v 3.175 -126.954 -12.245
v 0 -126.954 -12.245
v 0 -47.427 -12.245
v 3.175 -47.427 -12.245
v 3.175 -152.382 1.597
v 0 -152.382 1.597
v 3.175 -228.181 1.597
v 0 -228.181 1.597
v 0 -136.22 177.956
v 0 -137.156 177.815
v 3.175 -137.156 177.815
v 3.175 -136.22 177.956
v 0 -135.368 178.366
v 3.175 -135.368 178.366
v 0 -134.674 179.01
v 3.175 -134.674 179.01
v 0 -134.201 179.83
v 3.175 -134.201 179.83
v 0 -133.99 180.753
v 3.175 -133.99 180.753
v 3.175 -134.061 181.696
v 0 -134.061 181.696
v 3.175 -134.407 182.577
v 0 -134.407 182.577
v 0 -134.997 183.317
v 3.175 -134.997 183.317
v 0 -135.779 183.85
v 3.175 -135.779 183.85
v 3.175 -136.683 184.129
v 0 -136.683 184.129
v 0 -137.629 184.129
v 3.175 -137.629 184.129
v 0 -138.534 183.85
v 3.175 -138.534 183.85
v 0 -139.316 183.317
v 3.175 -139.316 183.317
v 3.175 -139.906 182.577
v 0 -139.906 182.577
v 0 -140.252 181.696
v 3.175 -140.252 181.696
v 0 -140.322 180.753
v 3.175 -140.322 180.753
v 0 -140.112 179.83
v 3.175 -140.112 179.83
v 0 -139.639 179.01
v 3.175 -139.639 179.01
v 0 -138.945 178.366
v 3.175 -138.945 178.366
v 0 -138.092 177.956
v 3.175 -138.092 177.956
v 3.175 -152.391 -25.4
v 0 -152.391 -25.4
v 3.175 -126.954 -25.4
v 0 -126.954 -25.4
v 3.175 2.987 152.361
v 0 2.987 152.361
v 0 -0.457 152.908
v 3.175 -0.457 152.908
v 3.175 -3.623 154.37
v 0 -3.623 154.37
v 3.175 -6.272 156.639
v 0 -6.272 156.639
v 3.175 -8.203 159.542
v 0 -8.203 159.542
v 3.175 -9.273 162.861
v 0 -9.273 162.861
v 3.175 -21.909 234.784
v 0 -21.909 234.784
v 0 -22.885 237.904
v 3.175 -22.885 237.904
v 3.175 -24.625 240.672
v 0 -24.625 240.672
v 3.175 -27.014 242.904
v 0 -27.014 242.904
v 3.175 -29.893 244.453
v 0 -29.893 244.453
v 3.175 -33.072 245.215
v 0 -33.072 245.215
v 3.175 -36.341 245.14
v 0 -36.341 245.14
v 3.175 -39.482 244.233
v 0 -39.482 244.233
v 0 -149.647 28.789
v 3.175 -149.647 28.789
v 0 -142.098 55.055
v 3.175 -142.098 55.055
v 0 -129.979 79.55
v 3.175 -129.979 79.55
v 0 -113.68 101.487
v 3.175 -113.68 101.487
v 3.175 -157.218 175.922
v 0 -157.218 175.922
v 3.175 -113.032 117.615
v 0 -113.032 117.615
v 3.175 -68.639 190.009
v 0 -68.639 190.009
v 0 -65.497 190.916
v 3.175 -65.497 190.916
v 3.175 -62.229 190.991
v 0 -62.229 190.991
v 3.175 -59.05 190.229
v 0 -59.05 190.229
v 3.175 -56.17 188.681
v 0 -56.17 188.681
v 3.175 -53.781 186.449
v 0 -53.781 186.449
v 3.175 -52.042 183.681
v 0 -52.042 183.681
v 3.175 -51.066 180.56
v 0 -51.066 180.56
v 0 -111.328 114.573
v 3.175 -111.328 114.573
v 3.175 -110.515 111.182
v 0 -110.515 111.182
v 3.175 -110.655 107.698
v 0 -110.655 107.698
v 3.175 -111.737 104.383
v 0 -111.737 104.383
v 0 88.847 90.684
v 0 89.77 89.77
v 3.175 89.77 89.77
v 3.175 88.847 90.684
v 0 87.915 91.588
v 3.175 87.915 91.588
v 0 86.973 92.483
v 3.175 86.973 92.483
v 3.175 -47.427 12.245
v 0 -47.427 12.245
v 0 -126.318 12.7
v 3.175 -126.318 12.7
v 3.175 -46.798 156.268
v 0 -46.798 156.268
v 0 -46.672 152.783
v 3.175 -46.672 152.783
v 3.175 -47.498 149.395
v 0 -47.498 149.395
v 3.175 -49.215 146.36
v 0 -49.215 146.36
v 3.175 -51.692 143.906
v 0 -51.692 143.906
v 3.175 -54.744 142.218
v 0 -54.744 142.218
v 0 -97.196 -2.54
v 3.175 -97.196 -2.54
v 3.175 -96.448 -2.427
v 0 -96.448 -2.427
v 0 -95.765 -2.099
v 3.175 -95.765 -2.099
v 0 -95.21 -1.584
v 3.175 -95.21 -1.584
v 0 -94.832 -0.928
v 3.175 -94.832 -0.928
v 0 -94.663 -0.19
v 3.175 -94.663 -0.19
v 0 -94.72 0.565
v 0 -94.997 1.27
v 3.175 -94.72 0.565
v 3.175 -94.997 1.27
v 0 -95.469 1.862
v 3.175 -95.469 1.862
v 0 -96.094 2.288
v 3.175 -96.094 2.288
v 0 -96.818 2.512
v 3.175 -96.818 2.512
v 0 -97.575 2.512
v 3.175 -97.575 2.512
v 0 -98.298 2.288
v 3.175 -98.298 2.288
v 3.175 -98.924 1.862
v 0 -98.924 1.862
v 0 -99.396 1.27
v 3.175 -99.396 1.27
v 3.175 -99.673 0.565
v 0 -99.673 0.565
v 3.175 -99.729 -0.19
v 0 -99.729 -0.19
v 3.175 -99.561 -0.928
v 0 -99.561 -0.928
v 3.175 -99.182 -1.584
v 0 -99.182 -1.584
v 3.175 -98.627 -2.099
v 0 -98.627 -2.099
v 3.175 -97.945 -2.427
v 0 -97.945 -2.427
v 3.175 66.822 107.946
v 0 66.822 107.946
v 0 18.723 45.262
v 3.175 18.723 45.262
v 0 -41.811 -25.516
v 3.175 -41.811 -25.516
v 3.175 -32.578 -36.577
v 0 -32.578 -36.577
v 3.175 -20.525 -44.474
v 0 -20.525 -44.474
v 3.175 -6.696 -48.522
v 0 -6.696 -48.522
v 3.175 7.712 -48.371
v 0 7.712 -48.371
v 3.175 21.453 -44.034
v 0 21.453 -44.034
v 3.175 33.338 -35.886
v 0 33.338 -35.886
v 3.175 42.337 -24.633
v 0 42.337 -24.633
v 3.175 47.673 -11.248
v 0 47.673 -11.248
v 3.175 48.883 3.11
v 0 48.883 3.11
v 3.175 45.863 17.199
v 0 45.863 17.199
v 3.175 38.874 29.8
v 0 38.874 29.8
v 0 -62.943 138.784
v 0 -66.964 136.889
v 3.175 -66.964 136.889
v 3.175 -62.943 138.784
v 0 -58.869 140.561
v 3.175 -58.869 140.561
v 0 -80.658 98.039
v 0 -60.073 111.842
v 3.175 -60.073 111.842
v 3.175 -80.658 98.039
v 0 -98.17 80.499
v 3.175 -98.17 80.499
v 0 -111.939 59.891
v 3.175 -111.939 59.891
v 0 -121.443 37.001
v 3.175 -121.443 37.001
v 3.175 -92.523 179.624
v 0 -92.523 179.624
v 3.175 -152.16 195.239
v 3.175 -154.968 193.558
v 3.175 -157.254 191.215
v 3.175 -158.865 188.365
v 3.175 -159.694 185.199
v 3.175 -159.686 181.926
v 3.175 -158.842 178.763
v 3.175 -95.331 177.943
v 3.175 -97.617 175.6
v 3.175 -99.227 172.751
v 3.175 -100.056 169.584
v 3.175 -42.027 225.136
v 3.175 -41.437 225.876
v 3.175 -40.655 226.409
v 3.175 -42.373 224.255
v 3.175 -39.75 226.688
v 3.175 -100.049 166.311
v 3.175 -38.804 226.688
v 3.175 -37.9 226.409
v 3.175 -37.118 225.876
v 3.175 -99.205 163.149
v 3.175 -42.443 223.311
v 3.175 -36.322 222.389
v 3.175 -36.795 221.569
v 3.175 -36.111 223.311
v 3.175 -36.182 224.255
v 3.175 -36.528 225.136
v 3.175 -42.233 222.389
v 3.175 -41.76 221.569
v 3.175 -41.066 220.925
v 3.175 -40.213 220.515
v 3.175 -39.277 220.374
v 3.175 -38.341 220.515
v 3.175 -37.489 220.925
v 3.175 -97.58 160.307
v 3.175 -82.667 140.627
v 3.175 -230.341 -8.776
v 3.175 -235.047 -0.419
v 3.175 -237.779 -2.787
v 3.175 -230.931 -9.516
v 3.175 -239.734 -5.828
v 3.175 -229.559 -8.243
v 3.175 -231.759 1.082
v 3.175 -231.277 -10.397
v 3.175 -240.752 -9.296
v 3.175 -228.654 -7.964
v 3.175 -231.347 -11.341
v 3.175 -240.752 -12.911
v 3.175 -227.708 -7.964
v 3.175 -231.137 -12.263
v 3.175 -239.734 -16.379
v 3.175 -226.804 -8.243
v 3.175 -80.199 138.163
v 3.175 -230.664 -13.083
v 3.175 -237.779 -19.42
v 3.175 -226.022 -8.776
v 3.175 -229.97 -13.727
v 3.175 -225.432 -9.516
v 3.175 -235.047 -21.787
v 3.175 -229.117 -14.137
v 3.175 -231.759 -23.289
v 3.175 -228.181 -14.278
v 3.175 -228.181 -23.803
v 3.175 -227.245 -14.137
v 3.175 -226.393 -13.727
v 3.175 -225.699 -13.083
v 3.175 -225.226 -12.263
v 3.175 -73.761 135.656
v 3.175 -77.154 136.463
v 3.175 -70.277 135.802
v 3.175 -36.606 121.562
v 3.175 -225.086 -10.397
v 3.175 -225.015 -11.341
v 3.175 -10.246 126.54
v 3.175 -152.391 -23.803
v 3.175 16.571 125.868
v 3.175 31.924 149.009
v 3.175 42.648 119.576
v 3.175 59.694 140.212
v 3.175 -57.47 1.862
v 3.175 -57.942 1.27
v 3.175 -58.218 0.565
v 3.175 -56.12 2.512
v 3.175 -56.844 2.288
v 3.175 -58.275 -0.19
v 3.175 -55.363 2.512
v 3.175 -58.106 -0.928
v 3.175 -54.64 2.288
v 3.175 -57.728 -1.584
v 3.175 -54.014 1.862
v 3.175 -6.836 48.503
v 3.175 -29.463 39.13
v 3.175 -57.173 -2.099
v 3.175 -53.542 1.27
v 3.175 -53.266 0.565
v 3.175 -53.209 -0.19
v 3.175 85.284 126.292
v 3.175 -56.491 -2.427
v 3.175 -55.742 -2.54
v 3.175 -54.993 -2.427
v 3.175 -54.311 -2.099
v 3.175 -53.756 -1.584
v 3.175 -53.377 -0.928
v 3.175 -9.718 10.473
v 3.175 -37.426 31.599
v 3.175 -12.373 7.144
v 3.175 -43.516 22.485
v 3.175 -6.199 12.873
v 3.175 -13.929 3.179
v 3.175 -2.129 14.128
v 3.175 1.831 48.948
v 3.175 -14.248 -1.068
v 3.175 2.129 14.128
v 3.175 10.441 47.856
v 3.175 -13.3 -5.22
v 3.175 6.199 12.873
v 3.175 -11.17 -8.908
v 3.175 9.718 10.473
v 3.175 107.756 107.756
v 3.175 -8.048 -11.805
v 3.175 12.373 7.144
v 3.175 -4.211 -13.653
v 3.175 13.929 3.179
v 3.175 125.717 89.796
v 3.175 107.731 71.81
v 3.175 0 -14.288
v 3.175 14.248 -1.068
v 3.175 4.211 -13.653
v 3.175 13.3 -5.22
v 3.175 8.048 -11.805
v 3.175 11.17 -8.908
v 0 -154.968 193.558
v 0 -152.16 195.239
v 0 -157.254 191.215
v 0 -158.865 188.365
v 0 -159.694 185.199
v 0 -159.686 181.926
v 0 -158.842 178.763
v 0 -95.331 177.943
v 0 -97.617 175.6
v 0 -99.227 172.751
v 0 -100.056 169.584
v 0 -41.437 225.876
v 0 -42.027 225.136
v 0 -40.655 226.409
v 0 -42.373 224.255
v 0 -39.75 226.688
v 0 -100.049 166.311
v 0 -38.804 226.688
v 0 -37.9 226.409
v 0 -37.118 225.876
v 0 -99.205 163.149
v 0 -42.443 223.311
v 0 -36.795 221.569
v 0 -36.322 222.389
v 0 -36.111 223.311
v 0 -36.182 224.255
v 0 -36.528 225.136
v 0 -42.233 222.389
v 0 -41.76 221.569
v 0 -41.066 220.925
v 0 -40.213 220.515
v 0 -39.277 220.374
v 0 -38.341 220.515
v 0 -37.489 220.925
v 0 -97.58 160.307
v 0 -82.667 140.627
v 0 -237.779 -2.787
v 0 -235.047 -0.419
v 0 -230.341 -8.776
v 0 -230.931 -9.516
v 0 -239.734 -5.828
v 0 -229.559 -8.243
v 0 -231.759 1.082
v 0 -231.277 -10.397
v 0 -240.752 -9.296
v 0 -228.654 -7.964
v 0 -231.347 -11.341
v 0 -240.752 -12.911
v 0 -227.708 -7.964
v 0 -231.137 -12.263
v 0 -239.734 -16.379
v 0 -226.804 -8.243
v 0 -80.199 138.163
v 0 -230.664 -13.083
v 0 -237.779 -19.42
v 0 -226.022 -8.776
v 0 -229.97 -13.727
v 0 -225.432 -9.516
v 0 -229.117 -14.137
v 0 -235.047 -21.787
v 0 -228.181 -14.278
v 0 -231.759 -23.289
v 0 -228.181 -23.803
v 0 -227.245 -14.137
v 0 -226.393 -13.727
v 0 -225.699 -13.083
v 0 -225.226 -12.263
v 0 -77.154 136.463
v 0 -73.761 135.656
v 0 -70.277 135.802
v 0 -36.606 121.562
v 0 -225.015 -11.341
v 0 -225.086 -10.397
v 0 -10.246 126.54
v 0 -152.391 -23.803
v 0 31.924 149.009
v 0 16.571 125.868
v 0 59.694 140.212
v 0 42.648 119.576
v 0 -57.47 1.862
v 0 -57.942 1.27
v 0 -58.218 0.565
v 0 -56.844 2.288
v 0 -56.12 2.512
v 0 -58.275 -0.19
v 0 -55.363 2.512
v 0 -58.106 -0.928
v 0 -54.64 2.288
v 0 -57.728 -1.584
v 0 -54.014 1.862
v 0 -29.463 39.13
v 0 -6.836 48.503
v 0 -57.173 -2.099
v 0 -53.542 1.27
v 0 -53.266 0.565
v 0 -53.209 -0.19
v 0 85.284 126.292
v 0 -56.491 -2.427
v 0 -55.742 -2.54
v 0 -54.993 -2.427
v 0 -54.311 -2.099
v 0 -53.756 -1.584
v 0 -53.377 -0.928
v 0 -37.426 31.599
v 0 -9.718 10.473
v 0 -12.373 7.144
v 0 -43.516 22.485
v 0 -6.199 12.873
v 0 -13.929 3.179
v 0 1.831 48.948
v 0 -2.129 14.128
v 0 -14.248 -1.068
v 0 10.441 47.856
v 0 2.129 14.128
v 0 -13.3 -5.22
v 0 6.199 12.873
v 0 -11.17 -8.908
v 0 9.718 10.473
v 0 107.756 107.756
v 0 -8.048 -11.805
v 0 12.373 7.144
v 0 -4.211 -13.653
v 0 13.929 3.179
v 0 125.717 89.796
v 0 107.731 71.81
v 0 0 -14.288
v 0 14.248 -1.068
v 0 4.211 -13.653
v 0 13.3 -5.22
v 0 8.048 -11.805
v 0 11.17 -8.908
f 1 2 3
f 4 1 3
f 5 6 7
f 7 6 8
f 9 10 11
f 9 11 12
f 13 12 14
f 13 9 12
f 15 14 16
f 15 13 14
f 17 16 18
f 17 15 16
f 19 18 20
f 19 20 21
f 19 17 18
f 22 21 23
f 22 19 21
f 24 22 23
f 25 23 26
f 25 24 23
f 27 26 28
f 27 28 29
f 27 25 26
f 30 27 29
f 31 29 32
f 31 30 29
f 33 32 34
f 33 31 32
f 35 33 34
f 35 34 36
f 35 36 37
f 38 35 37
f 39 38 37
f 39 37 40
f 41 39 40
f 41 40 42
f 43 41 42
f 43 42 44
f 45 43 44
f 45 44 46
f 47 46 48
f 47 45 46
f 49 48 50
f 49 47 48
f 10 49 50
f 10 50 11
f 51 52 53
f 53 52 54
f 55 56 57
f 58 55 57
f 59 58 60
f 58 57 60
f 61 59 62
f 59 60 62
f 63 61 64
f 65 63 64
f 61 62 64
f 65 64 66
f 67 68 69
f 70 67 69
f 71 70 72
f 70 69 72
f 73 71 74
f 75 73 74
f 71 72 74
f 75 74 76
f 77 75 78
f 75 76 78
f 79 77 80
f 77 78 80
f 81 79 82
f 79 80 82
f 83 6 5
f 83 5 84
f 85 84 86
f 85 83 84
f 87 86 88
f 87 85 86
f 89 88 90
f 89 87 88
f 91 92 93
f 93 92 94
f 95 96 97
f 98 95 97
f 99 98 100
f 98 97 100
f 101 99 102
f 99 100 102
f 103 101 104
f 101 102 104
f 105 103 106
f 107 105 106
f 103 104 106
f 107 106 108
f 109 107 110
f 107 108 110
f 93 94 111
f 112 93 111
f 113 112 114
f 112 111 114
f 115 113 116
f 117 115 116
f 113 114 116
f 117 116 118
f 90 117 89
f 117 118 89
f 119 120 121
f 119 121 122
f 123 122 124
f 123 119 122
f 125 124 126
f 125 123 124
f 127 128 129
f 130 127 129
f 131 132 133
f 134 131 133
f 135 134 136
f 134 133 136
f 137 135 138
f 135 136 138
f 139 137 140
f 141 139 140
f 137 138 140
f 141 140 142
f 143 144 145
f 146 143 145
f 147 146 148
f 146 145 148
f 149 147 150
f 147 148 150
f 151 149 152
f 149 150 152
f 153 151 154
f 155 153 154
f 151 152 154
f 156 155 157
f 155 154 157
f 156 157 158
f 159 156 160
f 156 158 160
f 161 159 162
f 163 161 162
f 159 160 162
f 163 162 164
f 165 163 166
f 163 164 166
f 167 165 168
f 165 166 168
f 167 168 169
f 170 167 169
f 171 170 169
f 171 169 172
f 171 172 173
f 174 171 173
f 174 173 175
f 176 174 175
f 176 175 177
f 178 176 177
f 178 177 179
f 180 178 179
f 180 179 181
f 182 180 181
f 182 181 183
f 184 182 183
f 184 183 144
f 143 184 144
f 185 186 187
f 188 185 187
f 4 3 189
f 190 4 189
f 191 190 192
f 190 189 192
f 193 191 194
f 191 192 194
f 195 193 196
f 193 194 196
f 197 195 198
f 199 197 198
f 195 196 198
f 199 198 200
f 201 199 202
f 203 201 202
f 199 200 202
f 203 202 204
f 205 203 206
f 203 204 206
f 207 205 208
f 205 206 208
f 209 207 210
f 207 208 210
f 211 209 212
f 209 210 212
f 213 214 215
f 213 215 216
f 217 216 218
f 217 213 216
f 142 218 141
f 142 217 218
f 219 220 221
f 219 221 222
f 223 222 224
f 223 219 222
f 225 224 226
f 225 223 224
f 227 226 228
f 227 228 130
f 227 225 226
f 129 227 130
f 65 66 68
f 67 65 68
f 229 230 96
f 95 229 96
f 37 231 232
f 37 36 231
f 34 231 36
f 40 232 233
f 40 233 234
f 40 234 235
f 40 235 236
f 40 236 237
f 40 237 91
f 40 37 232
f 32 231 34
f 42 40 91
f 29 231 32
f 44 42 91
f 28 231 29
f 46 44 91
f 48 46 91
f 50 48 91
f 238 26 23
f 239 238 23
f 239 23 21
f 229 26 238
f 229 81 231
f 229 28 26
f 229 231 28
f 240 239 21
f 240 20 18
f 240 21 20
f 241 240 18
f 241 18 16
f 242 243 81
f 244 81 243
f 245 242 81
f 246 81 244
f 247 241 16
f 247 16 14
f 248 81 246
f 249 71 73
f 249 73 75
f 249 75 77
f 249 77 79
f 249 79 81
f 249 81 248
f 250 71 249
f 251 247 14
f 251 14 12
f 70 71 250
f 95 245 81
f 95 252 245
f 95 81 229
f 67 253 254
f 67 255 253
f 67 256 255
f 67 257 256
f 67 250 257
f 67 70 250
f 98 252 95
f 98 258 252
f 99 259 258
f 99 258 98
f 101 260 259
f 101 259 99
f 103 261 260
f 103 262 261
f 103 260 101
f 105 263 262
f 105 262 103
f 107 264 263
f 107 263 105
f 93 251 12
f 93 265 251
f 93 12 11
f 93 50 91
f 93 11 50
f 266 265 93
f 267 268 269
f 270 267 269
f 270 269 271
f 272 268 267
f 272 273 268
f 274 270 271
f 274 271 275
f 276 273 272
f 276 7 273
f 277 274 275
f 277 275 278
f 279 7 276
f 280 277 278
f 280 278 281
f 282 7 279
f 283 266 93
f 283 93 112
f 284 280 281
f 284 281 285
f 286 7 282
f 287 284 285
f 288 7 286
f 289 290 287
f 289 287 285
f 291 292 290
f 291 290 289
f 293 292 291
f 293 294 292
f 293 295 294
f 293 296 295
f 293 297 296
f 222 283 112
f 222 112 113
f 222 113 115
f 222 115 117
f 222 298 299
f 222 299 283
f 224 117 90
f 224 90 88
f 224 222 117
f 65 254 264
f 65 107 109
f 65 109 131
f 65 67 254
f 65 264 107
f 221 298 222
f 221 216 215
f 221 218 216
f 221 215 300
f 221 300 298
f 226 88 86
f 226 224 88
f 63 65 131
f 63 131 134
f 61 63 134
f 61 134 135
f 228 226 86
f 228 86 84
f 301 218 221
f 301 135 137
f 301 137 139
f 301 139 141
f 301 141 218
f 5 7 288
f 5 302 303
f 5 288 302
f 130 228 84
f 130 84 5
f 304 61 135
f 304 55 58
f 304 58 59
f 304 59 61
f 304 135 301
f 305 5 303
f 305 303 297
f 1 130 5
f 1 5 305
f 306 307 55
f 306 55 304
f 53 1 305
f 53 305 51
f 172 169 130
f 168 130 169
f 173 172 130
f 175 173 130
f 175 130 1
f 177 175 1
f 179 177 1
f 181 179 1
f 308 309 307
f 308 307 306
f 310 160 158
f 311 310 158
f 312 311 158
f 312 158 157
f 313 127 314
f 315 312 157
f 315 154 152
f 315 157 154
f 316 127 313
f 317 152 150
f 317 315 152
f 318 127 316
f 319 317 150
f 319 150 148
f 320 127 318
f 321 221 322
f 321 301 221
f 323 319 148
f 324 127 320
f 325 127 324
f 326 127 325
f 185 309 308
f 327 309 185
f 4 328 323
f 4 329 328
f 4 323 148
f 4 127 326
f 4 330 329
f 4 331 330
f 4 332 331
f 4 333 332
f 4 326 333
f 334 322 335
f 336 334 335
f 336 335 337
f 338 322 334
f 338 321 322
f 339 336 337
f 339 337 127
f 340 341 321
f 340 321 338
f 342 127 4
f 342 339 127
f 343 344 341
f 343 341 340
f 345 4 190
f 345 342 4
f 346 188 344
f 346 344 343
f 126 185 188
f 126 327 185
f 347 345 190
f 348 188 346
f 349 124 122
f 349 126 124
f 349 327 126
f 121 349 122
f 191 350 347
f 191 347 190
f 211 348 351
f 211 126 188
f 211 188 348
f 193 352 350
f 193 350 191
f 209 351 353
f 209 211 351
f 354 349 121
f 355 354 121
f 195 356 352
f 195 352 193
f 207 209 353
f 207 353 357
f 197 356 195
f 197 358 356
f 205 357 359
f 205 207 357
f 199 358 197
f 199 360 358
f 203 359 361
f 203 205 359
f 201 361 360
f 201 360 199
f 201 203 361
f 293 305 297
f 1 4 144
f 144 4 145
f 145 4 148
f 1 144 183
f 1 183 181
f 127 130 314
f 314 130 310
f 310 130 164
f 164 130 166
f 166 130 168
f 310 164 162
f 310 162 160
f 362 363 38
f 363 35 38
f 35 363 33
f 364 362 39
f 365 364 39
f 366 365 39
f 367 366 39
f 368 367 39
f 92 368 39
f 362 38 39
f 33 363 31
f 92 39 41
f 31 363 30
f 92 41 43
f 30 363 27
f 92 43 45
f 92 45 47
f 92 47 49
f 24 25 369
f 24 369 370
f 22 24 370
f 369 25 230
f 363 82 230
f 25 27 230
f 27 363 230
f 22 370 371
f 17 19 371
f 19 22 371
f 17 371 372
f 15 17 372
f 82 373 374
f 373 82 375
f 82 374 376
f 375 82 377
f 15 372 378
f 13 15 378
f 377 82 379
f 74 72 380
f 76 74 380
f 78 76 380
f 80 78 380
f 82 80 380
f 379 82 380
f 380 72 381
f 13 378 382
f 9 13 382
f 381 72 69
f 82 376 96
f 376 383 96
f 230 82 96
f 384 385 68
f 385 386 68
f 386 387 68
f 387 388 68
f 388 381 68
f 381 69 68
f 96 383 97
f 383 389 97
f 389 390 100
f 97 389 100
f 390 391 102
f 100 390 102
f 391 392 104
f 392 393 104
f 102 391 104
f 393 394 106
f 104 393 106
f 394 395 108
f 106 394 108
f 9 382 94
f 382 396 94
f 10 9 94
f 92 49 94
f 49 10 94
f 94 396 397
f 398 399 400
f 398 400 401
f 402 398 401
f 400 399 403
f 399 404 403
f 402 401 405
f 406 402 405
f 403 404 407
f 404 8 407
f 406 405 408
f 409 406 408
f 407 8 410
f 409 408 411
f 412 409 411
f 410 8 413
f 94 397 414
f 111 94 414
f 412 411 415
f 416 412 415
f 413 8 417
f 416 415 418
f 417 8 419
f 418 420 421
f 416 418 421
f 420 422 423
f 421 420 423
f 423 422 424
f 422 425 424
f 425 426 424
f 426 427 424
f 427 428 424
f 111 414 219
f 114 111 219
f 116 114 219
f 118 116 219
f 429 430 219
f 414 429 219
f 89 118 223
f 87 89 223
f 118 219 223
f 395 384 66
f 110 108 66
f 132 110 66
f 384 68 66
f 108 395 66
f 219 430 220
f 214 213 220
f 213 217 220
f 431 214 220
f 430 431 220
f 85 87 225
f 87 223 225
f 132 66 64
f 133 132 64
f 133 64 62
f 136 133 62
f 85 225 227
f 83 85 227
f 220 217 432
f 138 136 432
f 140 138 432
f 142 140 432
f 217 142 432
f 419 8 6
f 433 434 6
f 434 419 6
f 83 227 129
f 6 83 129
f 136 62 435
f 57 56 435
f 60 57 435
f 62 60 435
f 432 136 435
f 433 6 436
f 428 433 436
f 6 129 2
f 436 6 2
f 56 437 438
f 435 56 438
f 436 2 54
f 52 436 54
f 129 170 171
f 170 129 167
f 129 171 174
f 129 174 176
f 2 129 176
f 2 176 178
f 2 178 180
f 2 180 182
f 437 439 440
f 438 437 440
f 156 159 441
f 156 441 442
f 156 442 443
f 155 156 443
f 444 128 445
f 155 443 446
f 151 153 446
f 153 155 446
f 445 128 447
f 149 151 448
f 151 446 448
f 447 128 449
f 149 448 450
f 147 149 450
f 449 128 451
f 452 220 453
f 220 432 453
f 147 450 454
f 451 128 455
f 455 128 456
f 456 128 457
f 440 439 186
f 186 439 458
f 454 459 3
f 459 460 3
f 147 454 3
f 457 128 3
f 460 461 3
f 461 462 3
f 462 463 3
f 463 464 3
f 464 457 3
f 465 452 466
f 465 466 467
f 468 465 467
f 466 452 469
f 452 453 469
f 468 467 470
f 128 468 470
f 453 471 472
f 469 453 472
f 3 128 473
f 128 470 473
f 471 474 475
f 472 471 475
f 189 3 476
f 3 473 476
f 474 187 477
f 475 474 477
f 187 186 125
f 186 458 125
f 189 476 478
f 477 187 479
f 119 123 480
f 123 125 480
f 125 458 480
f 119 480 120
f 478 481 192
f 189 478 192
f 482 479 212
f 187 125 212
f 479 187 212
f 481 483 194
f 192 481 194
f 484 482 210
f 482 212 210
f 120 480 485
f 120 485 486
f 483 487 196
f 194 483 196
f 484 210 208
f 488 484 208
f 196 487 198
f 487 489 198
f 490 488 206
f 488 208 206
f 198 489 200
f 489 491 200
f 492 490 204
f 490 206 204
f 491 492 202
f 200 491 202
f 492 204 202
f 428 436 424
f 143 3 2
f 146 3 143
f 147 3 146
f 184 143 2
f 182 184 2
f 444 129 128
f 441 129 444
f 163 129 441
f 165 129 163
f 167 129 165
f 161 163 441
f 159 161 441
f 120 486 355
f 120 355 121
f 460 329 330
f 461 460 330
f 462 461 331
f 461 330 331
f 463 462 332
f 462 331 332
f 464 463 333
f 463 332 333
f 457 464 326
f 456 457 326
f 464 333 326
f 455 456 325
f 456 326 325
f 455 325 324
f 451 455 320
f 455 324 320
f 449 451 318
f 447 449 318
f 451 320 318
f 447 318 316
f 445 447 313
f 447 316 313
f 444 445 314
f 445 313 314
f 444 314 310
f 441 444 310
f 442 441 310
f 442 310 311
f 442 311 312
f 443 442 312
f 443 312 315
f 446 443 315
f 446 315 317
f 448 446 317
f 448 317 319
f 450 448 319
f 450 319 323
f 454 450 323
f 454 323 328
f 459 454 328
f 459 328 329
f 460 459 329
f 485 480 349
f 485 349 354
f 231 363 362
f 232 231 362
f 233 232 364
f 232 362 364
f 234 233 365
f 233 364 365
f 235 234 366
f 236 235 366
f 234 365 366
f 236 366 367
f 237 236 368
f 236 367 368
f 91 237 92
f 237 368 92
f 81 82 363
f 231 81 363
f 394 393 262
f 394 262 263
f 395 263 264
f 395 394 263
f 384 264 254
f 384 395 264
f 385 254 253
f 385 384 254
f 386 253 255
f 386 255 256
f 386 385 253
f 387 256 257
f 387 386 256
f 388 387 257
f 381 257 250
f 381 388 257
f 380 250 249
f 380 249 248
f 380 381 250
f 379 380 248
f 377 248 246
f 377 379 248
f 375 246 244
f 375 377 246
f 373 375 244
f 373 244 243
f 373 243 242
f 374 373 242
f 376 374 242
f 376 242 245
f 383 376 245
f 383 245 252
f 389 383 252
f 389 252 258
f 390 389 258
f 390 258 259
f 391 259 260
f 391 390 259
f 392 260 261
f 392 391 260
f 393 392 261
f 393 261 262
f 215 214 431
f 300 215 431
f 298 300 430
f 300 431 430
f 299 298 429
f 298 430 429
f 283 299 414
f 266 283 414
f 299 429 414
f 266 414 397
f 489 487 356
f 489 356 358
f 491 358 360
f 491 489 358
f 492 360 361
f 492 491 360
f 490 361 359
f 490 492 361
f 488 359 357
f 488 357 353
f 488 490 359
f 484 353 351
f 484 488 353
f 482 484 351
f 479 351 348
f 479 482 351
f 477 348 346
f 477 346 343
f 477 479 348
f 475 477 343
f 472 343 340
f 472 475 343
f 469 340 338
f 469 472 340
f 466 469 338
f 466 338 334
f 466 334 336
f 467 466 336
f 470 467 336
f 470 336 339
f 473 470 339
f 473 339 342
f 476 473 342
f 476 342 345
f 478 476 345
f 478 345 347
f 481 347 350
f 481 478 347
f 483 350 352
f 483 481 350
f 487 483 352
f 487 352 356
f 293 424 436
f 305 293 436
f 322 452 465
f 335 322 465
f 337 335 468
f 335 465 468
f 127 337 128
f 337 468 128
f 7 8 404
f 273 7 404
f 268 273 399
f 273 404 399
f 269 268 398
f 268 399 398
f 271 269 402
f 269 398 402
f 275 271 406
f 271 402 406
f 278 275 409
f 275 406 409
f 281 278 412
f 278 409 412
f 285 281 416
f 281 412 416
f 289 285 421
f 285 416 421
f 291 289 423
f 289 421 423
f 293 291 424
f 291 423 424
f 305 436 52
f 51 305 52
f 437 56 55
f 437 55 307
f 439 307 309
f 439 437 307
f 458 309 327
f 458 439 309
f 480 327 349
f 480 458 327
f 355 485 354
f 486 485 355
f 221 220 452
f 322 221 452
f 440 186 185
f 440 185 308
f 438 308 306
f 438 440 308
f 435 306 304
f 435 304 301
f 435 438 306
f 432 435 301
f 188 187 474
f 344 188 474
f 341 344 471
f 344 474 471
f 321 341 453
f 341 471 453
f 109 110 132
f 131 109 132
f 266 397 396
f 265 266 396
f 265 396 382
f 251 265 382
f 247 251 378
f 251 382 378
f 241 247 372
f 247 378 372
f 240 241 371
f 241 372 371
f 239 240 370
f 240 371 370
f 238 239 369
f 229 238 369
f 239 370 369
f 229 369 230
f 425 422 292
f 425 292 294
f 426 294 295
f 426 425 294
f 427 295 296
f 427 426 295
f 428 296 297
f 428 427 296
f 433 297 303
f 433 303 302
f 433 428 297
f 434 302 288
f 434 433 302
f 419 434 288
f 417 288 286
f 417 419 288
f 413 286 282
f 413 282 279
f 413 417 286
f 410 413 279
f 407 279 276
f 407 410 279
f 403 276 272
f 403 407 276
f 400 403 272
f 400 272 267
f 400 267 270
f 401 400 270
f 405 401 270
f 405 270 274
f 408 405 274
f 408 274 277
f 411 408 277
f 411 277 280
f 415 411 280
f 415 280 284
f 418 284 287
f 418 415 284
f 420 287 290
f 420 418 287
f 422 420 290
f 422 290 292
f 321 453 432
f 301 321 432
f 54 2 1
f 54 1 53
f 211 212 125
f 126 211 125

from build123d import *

# Parameters (mm, degrees)
BOSS_EXTRUDE2_DEPTH = 3.175
SKETCH11_W          = 25.4
SKETCH11_H          = 25.436159883
BOSS_EXTRUDE4_DEPTH = 3.175
SKETCH12_R          = 3.175
BOSS_EXTRUDE5_DEPTH = 3.175
SKETCH13_R          = 3.175
BOSS_EXTRUDE6_DEPTH = 3.175
SKETCH14_R          = 14.2875
BOSS_EXTRUDE7_DEPTH = 3.175
SKETCH15_R          = 3.175
SKETCH15_R_2        = 2.54
CUT_EXTRUDE1_DEPTH  = 4.175


with BuildPart() as part:
    # Sketch9 → Boss-Extrude2 (new body)
    with BuildSketch(Plane(origin=(0, 0, 0), x_dir=(0, 0, -1), z_dir=(1, 0, 0))):
        with BuildLine():
            Line((0, -126.954378983), (0, -152.390538866))
            ThreePointArc((0, -152.390538866), (-140.790499807, -58.317334473), (-107.756383421, 107.756383421))
            Line((-107.756383421, 107.756383421), (-89.795871179, 125.716895663))
            Line((-89.795871179, 125.716895663), (-71.809790038, 107.730814523))
            Line((-71.809790038, 107.730814523), (-89.770302281, 89.770302281))
            ThreePointArc((-89.770302281, 89.770302281), (-117.290552306, -48.583337503), (0, -126.954378983))
        make_face()
    extrude(amount=BOSS_EXTRUDE2_DEPTH)

    # Sketch11 → Boss-Extrude4 (add)
    with BuildSketch(Plane(origin=(0, 0, 0), x_dir=(0, 0, -1), z_dir=(1, 0, 0))):
        with Locations((12.7, -139.672458925)):
            Rectangle(SKETCH11_W, SKETCH11_H)
    extrude(amount=BOSS_EXTRUDE4_DEPTH)

    # Sketch12 → Boss-Extrude5 (add)
    with BuildSketch(Plane(origin=(0, 0, 0), x_dir=(0, 0, -1), z_dir=(1, 0, 0))):
        with BuildLine():
            ThreePointArc((-1.596710848, -228.181271676), (11.103289152, -240.881271676), (23.803289152, -228.181271676))
            Line((23.803289152, -228.181271676), (23.803289152, -152.390538866))
            Line((23.803289152, -152.390538866), (0, -152.390538866))
            ThreePointArc((0, -152.390538866), (-0.79836638, -152.388447551), (-1.596710848, -152.382173664))
            Line((-1.596710848, -152.382173664), (-1.596710848, -228.181271676))
        make_face()
        with Locations((11.103289152, -228.181271676)):
            Circle(SKETCH12_R, mode=Mode.SUBTRACT)
    extrude(amount=BOSS_EXTRUDE5_DEPTH)

    # Sketch13 → Boss-Extrude6 (add)
    with BuildSketch(Plane(origin=(0, 0, 0), x_dir=(0, 0, -1), z_dir=(1, 0, 0))):
        with BuildLine():
            Line((-175.921744047, -157.217647079), (-117.615441364, -113.032446562))
            ThreePointArc((-117.615441364, -113.032446562), (-109.43511183, -110.464604073), (-101.487144145, -113.680411283))
            ThreePointArc((-101.487144145, -113.680411283), (-121.45550521, -92.040407377), (-136.889329567, -66.964078331))
            ThreePointArc((-136.889329567, -66.964078331), (-135.942652679, -75.485545881), (-140.626971786, -82.666685125))
            Line((-140.626971786, -82.666685125), (-160.306949591, -97.58040329))
            ThreePointArc((-160.306949591, -97.58040329), (-171.19425961, -99.744336405), (-179.624122676, -92.522595986))
            Line((-179.624122676, -92.522595986), (-190.009209059, -68.638532465))
            ThreePointArc((-190.009209059, -68.638532465), (-189.548026602, -57.559851452), (-180.560256724, -51.066019389))
            Line((-180.560256724, -51.066019389), (-156.267984197, -46.797896728))
            ThreePointArc((-156.267984197, -46.797896728), (-147.818260582, -48.251780205), (-142.218034883, -54.744012368))
            ThreePointArc((-142.218034883, -54.744012368), (-150.091480412, -26.370890083), (-152.361266177, 2.986788389))
            ThreePointArc((-152.361266177, 2.986788389), (-155.413049284, -5.02559117), (-162.861116025, -9.272697026))
            Line((-162.861116025, -9.272697026), (-234.783717211, -21.90941035))
            ThreePointArc((-234.783717211, -21.90941035), (-243.771487088, -28.403242413), (-244.232669546, -39.481923426))
            Line((-244.232669546, -39.481923426), (-195.238917132, -152.159839775))
            ThreePointArc((-195.238917132, -152.159839775), (-186.809054067, -159.381580194), (-175.921744047, -157.217647079))
        make_face()
        with Locations((-180.989788445, -137.156185968)):
            Circle(SKETCH13_R, mode=Mode.SUBTRACT)
        with Locations((-223.548763187, -39.27724509)):
            Circle(SKETCH13_R, mode=Mode.SUBTRACT)
    extrude(amount=BOSS_EXTRUDE6_DEPTH)

    # Sketch14 → Boss-Extrude7 (add)
    with BuildSketch(Plane(origin=(0, 0, 0), x_dir=(0, 0, -1), z_dir=(1, 0, 0))):
        with BuildLine():
            Line((-29.799778624, 38.874174032), (-100.328890576, 92.993065071))
            Line((-100.328890576, 92.993065071), (-115.791430873, 72.841890227))
            Line((-115.791430873, 72.841890227), (-45.262318921, 18.722999189))
            ThreePointArc((-45.262318921, 18.722999189), (-48.592985775, 6.160352763), (-48.502549248, -6.836002425))
            Line((-48.502549248, -6.836002425), (-121.562281943, -36.60636491))
            ThreePointArc((-121.562281943, -36.60636491), (-117.290552306, -48.583337503), (-111.842122761, -60.072905036))
            Line((-111.842122761, -60.072905036), (-39.130265149, -29.462697807))
            ThreePointArc((-39.130265149, -29.462697807), (-27.212895153, -40.726975705), (-12.2454793, -47.426537396))
            Line((-12.2454793, -47.426537396), (-12.7, -126.317553583))
            ThreePointArc((-12.7, -126.317553583), (-6.357978189, -126.795072682), (0, -126.954378983))
            Line((0, -126.954378983), (12.2454793, -126.954378983))
            Line((12.2454793, -126.954378983), (12.2454793, -47.426537396))
            ThreePointArc((12.2454793, -47.426537396), (44.033981815, 21.453127004), (-29.799778624, 38.874174032))
        make_face()
        Circle(SKETCH14_R, mode=Mode.SUBTRACT)
    extrude(amount=BOSS_EXTRUDE7_DEPTH)

    # Sketch15 → Cut-Extrude1 (cut, through all)
    with BuildSketch(Plane(origin=(3.175, 0, 0), x_dir=(0, 0, -1), z_dir=(1, 0, 0))):
        with Locations((11.103289152, -228.181271676)):
            Circle(SKETCH15_R)
        with Locations((0, -55.741886393)):
            Circle(SKETCH15_R_2)
        with Locations((0, -97.196272786)):
            Circle(SKETCH15_R_2)
    extrude(amount=-CUT_EXTRUDE1_DEPTH, mode=Mode.SUBTRACT)


solid = part.part
